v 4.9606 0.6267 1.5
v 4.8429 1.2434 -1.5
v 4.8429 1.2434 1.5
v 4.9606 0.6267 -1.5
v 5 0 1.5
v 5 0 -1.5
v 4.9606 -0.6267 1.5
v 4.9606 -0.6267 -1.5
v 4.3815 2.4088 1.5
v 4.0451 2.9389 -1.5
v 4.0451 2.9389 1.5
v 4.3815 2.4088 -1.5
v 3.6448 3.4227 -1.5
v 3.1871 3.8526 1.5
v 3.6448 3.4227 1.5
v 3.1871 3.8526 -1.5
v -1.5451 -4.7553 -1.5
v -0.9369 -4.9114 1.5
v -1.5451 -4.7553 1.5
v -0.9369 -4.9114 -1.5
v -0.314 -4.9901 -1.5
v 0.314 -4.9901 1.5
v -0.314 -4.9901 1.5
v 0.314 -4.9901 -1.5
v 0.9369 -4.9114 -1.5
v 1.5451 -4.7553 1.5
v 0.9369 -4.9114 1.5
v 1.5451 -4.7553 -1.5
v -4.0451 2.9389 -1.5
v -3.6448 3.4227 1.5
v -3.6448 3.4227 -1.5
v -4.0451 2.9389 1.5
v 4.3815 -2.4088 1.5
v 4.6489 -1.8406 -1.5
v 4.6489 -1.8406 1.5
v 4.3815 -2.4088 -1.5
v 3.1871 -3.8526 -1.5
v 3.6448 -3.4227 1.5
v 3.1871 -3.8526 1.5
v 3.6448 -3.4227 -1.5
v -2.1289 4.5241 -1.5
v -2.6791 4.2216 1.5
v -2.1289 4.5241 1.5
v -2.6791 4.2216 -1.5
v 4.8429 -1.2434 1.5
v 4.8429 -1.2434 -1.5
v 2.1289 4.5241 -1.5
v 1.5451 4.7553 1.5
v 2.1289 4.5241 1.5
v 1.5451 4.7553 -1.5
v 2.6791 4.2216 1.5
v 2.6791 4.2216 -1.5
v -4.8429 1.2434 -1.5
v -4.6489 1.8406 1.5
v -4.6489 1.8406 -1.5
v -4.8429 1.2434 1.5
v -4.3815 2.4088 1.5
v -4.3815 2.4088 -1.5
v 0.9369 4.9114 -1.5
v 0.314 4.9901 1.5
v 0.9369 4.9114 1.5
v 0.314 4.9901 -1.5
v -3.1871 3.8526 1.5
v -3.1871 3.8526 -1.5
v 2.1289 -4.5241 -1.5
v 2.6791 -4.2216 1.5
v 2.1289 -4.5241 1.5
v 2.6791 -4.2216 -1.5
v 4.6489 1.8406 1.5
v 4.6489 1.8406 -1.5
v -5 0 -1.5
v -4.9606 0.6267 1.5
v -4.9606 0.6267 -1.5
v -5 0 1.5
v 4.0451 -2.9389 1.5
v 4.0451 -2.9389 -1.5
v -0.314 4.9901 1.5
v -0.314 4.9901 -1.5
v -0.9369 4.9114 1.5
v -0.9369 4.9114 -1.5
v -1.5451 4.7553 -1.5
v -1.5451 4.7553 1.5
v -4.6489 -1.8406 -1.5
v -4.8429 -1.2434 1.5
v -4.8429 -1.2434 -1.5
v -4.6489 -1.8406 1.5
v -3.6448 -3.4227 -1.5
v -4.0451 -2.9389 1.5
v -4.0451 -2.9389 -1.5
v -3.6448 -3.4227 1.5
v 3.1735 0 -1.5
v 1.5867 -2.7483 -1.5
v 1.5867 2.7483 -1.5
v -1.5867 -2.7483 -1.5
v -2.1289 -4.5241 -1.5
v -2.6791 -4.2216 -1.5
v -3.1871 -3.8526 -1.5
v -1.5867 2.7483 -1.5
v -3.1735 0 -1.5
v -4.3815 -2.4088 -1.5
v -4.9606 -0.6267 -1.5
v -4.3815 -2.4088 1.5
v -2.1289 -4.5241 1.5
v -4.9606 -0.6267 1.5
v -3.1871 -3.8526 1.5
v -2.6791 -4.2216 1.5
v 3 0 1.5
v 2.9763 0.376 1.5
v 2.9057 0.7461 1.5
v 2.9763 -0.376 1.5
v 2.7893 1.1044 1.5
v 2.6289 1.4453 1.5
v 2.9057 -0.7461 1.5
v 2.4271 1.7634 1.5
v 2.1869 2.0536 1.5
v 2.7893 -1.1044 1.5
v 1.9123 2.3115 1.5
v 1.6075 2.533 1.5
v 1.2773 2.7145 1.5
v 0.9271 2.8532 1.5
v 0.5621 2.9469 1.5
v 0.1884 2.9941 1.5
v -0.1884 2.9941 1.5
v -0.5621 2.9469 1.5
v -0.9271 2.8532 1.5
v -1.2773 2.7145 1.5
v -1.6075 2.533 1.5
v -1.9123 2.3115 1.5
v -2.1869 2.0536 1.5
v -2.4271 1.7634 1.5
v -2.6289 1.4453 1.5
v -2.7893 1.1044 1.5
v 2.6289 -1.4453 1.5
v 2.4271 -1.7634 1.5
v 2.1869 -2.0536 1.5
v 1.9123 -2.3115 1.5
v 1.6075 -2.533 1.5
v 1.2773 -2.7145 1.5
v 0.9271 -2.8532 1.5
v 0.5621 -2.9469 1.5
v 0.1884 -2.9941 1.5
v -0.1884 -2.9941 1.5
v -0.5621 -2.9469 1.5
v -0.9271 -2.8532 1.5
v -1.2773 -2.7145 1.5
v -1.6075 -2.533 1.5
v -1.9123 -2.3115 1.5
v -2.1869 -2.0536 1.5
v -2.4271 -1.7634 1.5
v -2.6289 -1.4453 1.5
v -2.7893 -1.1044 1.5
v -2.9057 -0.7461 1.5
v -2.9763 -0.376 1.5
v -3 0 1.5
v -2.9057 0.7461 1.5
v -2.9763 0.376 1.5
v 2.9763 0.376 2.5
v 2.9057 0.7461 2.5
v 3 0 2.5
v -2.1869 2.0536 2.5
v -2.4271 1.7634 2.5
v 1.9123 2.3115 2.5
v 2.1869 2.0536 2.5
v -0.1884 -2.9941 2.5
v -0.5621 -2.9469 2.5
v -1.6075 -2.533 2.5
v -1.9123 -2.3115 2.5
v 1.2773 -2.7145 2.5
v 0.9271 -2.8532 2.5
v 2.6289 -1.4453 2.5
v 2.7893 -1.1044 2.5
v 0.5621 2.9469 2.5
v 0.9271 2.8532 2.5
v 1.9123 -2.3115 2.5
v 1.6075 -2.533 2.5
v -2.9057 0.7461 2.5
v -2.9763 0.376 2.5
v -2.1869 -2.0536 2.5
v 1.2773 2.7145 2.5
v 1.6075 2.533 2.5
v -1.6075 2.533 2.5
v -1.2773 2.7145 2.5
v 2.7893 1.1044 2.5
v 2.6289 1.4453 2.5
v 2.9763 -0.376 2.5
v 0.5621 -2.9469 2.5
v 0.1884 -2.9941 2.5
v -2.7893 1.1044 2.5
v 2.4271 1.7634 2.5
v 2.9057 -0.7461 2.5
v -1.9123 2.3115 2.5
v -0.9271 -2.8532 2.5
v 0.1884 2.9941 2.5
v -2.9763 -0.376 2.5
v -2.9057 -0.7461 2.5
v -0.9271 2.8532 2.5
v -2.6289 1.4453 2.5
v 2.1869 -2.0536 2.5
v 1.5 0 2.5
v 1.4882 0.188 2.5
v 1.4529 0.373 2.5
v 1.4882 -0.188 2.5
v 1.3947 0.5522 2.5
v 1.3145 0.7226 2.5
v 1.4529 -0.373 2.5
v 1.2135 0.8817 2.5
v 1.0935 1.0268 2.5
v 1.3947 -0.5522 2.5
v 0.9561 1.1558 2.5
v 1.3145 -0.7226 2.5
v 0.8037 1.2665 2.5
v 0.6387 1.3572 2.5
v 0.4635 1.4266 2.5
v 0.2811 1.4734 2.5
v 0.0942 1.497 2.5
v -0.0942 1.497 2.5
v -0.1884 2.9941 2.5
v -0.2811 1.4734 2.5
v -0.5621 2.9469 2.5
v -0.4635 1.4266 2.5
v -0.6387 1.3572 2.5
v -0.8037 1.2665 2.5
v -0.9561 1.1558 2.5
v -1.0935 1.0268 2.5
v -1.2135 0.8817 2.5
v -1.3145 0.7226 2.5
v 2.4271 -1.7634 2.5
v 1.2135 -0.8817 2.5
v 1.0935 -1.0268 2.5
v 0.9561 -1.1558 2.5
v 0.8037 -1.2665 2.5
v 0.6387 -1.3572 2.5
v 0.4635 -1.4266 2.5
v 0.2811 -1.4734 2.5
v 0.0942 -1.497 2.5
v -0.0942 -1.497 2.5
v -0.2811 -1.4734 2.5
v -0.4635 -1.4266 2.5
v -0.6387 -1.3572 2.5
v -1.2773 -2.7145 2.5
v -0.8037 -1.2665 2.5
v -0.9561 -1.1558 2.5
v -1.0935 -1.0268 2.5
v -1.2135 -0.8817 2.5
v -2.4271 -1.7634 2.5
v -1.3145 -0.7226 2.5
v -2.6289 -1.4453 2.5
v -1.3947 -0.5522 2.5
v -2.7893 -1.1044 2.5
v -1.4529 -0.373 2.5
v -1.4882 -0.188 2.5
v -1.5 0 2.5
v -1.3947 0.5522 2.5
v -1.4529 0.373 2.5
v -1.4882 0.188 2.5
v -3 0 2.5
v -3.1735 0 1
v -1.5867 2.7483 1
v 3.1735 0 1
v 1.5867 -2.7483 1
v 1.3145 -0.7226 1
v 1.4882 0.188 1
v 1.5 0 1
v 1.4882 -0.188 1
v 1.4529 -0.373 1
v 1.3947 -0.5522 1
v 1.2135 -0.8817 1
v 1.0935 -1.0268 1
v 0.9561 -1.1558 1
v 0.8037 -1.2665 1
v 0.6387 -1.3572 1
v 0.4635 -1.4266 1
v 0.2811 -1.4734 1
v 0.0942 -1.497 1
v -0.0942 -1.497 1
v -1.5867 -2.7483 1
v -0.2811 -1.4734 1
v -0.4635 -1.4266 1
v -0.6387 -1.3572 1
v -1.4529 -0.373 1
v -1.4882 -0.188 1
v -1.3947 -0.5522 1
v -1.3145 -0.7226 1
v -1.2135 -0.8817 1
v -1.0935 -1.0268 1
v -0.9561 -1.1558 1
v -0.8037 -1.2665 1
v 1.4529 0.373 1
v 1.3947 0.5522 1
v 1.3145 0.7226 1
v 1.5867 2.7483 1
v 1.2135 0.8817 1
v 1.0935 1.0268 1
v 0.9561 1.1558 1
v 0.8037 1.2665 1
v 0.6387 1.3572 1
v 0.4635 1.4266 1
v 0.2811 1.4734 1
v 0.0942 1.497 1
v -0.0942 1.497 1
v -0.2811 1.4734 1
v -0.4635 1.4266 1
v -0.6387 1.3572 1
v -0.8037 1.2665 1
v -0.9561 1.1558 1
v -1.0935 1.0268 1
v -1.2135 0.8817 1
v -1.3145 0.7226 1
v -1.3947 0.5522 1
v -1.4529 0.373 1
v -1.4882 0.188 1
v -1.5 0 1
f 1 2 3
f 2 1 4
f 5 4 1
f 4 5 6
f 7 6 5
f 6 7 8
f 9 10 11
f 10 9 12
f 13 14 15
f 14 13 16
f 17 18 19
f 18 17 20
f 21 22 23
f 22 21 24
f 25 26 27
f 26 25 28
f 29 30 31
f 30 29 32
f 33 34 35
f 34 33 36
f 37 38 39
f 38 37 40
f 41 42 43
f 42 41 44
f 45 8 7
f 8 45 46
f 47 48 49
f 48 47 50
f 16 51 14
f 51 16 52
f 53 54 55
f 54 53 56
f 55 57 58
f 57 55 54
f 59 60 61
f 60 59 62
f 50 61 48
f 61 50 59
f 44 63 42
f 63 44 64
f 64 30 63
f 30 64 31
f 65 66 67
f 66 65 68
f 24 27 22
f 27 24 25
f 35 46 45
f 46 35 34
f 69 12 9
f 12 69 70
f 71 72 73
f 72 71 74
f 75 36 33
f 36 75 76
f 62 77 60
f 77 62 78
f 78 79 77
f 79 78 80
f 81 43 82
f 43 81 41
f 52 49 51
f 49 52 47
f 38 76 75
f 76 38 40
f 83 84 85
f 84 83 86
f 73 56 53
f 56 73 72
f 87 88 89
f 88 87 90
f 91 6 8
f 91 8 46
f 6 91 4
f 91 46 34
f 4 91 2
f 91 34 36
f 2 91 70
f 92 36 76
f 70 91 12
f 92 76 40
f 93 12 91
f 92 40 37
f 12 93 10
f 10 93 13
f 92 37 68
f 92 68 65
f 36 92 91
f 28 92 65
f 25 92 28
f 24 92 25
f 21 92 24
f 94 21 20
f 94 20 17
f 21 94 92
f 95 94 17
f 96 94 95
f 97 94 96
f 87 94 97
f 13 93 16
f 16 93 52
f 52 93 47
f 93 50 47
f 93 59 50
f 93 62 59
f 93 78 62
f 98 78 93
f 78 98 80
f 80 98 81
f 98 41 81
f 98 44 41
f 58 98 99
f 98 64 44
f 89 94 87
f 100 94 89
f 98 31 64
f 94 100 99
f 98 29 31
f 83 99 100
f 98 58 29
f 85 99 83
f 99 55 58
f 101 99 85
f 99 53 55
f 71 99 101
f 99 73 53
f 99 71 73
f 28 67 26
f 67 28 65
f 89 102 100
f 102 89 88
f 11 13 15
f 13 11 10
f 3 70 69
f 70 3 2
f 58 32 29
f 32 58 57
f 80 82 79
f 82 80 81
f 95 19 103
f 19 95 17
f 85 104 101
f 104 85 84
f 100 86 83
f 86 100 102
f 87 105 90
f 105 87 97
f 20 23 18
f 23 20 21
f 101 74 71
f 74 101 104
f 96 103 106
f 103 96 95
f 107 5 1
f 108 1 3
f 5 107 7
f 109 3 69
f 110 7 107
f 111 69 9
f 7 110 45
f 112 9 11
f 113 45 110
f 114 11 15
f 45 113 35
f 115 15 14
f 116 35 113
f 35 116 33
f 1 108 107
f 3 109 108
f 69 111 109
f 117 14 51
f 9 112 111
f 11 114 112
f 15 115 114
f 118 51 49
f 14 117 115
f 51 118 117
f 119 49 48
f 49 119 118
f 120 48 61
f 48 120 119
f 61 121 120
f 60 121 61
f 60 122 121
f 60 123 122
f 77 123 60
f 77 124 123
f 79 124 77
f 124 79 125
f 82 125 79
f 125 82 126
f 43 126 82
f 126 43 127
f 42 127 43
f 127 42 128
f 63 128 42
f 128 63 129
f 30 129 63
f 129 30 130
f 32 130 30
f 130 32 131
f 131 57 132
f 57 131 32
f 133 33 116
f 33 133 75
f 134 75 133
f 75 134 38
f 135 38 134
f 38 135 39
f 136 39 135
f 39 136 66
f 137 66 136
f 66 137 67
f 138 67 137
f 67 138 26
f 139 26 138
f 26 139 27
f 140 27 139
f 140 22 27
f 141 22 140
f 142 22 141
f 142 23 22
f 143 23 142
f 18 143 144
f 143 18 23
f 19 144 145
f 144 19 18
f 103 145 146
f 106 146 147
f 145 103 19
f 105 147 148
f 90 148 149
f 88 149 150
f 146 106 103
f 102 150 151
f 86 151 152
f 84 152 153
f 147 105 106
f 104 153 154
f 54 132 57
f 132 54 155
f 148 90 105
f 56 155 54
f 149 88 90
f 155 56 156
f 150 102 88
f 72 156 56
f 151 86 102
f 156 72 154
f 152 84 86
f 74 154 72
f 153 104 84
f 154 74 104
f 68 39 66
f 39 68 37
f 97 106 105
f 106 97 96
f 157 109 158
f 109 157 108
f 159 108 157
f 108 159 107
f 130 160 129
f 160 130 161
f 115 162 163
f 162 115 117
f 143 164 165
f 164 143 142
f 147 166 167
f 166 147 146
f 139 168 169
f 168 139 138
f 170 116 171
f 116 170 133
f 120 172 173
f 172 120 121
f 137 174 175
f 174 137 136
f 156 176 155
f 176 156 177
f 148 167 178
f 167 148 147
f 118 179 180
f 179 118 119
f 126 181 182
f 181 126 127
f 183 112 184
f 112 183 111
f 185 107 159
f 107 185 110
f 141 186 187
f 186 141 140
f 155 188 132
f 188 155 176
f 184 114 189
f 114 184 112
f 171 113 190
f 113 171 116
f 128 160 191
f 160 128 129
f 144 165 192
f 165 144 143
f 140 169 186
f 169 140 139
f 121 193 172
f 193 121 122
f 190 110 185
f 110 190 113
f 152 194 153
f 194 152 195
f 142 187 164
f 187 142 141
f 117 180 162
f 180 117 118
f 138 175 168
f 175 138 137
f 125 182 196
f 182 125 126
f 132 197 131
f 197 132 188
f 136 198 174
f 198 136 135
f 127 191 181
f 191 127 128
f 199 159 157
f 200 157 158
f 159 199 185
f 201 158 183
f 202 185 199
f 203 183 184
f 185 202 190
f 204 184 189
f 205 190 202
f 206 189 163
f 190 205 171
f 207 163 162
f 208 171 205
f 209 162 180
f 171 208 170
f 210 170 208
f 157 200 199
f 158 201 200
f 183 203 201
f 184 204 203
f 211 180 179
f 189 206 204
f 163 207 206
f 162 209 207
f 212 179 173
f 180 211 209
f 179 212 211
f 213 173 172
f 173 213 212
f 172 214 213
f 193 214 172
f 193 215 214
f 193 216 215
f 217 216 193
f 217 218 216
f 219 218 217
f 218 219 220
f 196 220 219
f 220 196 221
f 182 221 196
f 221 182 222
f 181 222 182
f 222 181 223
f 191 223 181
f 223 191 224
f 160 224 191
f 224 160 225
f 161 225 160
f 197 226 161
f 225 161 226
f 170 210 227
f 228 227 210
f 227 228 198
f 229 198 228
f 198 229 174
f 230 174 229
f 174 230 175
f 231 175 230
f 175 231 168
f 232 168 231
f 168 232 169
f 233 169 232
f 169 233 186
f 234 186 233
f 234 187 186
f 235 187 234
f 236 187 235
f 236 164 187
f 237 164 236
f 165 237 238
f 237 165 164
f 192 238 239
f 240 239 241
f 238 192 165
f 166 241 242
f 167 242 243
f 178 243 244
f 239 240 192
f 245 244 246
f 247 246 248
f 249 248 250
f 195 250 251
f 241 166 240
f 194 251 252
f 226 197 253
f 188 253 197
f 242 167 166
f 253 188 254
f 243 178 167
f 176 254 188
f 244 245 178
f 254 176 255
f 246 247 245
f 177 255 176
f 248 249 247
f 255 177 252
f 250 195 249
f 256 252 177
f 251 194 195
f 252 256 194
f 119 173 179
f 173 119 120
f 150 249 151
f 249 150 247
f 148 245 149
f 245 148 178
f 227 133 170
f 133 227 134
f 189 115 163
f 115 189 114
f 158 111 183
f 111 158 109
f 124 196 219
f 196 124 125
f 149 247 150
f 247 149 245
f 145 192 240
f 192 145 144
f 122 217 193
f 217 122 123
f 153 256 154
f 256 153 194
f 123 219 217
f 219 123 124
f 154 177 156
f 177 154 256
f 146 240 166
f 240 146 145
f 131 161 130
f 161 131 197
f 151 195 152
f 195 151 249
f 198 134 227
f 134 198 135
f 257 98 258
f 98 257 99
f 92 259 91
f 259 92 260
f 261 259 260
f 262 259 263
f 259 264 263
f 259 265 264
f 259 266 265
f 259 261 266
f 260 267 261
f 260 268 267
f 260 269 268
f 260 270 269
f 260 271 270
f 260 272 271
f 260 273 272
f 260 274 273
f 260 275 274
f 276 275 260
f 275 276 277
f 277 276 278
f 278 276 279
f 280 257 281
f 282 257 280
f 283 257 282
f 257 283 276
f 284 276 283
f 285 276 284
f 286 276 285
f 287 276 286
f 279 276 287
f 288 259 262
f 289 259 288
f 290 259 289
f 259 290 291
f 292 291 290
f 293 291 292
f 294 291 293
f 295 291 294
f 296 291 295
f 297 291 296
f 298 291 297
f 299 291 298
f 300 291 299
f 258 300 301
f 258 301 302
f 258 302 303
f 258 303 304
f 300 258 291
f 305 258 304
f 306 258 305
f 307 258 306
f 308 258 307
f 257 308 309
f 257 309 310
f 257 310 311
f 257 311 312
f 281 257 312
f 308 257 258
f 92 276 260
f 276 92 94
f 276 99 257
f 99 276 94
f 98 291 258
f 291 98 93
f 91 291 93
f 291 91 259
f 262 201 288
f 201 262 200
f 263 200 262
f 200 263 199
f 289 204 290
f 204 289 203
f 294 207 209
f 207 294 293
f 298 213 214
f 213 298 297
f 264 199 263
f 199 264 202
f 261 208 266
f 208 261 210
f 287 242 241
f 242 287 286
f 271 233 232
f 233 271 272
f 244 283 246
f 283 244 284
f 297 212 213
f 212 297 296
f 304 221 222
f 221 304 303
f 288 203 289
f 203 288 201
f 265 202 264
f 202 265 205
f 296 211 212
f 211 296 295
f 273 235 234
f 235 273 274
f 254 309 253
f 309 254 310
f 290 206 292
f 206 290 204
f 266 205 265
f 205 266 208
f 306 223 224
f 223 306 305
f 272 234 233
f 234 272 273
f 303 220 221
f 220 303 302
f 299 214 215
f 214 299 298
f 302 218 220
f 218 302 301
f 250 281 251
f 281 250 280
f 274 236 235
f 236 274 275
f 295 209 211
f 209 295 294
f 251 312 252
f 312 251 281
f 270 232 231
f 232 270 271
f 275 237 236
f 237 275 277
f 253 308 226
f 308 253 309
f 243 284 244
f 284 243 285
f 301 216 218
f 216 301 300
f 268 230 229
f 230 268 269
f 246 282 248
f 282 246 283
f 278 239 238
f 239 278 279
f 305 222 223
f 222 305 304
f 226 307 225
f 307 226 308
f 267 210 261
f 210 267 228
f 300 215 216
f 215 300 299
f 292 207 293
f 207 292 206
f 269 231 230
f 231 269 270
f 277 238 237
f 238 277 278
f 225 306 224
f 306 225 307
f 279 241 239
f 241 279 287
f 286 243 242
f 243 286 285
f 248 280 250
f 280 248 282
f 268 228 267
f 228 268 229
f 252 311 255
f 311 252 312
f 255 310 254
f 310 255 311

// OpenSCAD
$fn = 50;


difference() {
	union() {
		translate(v = [0, 0, -1.5000000000]) {
			cylinder(h = 3, r = 5.0000000000);
		}
		translate(v = [0, 0, -1.5000000000]) {
			cylinder(h = 4, r = 3.0000000000);
		}
	}
	union() {
		translate(v = [0, 0, -1.5000000000]) {
			rotate(a = [0, 0, 0]) {
				difference() {
					union() {
						#linear_extrude(height = 2.5000000000) {
							polygon(points = [[3.1735000000, 0.0000000000], [1.5867500000, 2.7483316189], [-1.5867500000, 2.7483316189], [-3.1735000000, 0.0000000000], [-1.5867500000, -2.7483316189], [1.5867500000, -2.7483316189]]);
						}
					}
					union();
				}
			}
		}
		translate(v = [0, 0, -50.0000000000]) {
			cylinder(h = 100, r = 1.5000000000);
		}
	}
}
